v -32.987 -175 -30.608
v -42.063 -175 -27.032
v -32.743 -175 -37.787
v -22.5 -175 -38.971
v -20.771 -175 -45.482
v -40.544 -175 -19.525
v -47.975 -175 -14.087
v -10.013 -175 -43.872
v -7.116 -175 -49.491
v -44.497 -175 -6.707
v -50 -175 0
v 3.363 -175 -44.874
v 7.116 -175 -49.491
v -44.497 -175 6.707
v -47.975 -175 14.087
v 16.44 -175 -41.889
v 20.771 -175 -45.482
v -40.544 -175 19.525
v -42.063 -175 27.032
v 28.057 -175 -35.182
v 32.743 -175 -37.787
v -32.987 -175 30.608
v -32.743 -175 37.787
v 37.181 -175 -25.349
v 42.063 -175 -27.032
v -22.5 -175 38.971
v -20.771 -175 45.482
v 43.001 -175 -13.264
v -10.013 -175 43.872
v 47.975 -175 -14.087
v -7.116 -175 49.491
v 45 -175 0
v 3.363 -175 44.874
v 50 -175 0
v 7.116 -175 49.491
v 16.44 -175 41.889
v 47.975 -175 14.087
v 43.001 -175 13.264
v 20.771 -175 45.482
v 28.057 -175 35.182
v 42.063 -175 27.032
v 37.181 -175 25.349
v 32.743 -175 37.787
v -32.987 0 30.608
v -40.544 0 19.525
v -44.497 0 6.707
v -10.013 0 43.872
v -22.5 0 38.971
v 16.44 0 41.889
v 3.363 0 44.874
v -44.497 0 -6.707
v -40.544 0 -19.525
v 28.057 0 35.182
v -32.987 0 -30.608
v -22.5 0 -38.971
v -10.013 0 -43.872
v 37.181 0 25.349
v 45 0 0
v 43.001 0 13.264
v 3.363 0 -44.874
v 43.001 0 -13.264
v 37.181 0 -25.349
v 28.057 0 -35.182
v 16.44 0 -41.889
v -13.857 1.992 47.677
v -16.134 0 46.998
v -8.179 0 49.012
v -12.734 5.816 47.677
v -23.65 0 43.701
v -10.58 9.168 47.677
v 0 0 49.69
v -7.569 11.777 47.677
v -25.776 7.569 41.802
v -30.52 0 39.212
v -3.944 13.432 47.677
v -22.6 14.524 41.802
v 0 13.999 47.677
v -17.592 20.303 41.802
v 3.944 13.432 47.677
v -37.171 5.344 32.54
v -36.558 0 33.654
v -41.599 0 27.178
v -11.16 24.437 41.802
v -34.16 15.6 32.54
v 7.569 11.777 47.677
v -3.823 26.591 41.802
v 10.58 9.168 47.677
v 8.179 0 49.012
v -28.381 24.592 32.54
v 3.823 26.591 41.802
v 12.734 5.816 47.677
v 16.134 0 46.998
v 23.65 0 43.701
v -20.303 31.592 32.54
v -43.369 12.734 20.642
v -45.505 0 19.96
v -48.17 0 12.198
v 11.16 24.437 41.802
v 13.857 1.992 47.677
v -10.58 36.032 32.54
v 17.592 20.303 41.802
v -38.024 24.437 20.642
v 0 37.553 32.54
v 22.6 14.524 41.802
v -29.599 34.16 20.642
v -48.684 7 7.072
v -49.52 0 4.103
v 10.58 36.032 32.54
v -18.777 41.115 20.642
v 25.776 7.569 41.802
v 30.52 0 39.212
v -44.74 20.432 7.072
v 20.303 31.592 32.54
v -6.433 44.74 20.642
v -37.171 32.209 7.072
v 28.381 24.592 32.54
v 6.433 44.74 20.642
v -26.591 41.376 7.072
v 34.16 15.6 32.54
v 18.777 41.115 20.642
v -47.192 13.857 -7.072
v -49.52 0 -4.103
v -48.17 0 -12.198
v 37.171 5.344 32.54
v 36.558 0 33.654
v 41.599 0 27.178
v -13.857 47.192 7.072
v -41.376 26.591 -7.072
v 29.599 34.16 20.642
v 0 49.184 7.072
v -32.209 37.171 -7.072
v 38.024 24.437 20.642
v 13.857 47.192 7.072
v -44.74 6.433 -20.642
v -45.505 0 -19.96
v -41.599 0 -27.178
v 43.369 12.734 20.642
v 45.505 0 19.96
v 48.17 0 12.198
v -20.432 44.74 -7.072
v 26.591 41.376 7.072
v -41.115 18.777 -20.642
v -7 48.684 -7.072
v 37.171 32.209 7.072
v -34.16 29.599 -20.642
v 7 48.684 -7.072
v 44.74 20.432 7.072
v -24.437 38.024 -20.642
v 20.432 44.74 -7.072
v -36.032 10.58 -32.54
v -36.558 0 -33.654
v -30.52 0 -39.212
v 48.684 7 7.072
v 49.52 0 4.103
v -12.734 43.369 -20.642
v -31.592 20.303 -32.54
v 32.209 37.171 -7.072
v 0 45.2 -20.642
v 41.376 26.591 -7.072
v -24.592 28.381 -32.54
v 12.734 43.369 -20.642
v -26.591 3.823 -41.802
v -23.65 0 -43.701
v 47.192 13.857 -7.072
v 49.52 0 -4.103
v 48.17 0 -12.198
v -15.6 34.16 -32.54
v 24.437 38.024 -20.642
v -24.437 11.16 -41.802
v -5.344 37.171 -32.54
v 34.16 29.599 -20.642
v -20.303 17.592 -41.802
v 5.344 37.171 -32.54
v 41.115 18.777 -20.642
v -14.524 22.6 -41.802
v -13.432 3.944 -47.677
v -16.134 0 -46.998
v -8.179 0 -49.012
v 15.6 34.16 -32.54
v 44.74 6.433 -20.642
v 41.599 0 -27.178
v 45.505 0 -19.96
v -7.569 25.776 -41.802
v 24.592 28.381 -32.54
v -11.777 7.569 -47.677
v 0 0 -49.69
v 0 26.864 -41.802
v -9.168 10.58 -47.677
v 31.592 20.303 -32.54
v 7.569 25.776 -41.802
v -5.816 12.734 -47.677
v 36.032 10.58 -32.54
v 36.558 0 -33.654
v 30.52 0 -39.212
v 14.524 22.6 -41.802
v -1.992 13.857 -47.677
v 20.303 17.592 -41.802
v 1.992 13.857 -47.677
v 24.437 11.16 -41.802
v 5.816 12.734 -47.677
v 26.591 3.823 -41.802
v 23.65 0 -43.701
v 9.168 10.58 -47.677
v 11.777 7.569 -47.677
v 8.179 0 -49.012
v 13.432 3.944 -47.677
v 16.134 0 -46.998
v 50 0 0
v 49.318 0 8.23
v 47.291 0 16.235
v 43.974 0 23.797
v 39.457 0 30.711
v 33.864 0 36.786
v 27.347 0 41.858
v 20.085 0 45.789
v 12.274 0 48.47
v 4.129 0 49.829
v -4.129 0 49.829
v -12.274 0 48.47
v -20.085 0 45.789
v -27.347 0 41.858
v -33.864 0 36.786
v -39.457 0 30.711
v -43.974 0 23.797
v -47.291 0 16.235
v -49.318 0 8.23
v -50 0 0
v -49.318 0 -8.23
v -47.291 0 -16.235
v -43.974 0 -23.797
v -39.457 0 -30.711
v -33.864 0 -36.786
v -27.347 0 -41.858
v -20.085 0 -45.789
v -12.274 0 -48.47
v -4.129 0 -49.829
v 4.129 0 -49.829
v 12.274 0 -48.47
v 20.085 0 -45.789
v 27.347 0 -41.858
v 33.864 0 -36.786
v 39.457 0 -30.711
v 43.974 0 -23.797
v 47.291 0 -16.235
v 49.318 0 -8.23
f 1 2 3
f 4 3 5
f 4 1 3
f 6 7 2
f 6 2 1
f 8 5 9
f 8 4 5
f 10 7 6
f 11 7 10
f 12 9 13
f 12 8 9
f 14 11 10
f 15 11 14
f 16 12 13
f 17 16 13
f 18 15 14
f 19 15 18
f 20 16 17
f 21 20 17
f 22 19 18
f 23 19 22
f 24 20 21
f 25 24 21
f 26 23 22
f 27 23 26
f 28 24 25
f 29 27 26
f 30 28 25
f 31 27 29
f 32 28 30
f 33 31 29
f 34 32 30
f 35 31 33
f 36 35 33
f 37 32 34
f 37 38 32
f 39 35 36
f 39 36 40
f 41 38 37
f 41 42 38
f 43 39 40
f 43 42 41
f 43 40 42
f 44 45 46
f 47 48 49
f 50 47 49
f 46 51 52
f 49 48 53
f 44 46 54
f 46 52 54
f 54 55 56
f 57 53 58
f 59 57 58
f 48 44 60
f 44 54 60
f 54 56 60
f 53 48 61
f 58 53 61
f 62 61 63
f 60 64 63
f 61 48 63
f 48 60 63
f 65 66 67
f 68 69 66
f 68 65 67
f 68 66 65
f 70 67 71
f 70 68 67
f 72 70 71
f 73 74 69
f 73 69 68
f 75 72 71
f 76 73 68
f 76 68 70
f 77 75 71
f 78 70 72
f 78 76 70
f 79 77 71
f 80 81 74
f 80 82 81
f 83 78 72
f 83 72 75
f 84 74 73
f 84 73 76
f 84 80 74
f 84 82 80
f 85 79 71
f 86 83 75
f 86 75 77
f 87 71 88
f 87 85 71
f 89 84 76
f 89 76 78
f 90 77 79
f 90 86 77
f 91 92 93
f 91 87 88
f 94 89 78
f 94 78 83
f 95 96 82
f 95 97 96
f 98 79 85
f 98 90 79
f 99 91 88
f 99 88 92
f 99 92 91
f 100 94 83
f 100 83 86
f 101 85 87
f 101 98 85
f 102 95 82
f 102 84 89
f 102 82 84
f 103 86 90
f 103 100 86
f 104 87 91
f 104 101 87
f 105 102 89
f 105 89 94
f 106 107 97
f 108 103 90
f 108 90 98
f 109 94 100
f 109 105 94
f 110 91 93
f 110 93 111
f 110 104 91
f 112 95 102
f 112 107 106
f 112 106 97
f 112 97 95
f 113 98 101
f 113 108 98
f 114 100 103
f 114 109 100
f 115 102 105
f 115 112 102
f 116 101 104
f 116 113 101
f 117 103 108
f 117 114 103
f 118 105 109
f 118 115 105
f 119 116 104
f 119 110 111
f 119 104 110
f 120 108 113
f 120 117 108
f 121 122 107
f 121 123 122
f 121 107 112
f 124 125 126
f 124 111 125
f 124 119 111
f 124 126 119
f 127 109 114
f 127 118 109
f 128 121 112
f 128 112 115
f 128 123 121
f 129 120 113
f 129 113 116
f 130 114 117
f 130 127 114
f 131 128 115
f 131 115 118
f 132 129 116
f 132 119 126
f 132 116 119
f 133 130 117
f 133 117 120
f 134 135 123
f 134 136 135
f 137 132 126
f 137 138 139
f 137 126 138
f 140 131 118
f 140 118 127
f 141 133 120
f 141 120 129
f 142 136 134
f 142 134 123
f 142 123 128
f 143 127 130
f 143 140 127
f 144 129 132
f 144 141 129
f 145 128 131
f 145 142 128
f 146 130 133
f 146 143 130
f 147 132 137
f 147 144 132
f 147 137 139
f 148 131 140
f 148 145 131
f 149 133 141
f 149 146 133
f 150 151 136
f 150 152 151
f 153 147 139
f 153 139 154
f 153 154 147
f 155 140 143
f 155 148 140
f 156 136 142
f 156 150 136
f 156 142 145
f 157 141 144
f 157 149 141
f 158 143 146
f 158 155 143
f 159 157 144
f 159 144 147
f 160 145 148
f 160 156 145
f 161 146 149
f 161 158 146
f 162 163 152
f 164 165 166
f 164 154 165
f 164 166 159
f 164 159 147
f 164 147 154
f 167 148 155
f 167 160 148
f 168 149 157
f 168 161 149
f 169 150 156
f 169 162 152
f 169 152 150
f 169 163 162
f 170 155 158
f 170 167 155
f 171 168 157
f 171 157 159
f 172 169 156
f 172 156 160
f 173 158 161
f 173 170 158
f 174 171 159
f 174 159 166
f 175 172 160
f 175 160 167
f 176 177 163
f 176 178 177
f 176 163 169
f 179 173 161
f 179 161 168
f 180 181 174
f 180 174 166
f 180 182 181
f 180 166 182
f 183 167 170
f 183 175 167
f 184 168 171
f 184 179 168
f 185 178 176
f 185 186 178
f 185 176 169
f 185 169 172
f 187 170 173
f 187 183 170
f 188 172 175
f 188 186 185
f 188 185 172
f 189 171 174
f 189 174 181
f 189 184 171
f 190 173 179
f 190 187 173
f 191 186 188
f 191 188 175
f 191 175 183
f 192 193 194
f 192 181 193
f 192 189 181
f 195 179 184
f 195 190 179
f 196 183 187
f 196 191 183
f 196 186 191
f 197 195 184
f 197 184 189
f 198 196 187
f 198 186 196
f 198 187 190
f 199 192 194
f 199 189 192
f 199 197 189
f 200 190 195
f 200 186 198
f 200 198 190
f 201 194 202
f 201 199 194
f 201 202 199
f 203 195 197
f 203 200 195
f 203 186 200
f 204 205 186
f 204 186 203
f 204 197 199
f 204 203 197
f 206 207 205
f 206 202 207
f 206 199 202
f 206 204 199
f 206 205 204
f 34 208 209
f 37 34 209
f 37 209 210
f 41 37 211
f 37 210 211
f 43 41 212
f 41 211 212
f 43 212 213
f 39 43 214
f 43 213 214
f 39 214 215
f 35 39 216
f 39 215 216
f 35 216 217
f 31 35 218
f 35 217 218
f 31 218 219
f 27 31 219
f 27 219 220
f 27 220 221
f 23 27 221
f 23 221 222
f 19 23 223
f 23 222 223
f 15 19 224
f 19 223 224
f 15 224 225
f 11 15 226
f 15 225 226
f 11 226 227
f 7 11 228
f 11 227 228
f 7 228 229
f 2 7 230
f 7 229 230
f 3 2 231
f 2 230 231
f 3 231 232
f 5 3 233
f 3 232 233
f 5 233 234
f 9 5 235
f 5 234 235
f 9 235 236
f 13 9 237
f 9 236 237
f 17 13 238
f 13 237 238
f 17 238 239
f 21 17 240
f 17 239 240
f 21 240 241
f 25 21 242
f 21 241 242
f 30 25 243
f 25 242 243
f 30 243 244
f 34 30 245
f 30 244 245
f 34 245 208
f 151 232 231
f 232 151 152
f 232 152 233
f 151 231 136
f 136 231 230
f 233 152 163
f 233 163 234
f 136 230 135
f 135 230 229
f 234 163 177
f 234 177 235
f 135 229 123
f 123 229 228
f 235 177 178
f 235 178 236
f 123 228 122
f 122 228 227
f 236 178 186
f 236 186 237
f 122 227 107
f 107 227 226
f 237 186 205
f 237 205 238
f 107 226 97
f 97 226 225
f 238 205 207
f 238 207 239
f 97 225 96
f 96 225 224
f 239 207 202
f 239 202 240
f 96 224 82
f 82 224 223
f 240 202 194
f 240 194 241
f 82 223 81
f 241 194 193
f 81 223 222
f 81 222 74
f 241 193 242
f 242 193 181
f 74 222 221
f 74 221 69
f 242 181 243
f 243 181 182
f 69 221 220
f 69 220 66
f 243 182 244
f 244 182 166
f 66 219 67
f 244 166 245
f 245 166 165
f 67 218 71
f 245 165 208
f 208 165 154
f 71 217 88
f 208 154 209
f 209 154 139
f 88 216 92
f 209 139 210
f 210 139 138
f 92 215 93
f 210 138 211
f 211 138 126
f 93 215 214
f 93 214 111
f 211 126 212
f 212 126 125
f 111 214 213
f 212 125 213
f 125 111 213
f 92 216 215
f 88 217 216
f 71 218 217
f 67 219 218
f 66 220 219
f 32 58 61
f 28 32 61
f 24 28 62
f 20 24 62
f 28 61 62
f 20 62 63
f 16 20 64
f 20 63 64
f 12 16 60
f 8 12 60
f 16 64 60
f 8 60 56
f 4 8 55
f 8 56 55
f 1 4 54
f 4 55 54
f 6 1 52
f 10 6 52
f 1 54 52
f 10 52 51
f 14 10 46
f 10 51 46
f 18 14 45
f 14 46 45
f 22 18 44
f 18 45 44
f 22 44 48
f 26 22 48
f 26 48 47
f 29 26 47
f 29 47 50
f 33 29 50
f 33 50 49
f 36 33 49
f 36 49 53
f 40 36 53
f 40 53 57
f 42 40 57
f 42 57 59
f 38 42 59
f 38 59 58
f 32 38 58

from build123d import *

# Parameters (mm, degrees)
F0_R     = 50
F1_DEPTH = 175
F5_D     = 90
F5_DEPTH = 175.001


with BuildPart() as f1:
    # F0 (on Front) → F1 (new body)
    with BuildSketch(Plane.XZ):
        Circle(F0_R)
    extrude(amount=F1_DEPTH)

    # F2 (on Front) → F3 (revolve)
    with BuildSketch(Plane.XZ):
        with BuildLine():
            Line((0, -49.6900500015), (0, 49.6900500015))
            ThreePointArc((0, 49.6900500015), (-49.6900500015, 0), (0, -49.6900500015))
        make_face()
    revolve(axis=Axis((0, 0, 0), (0, 0, -1)))

    # F5 (through all, one way)
    with BuildSketch(Plane(origin=(0, 0, 0), x_dir=(1, 0, 0), z_dir=(0, 1, 0))):
        with Locations((0, 0)):
            Circle(F5_D / 2)
    extrude(amount=-F5_DEPTH, mode=Mode.SUBTRACT)


solid = f1.part
